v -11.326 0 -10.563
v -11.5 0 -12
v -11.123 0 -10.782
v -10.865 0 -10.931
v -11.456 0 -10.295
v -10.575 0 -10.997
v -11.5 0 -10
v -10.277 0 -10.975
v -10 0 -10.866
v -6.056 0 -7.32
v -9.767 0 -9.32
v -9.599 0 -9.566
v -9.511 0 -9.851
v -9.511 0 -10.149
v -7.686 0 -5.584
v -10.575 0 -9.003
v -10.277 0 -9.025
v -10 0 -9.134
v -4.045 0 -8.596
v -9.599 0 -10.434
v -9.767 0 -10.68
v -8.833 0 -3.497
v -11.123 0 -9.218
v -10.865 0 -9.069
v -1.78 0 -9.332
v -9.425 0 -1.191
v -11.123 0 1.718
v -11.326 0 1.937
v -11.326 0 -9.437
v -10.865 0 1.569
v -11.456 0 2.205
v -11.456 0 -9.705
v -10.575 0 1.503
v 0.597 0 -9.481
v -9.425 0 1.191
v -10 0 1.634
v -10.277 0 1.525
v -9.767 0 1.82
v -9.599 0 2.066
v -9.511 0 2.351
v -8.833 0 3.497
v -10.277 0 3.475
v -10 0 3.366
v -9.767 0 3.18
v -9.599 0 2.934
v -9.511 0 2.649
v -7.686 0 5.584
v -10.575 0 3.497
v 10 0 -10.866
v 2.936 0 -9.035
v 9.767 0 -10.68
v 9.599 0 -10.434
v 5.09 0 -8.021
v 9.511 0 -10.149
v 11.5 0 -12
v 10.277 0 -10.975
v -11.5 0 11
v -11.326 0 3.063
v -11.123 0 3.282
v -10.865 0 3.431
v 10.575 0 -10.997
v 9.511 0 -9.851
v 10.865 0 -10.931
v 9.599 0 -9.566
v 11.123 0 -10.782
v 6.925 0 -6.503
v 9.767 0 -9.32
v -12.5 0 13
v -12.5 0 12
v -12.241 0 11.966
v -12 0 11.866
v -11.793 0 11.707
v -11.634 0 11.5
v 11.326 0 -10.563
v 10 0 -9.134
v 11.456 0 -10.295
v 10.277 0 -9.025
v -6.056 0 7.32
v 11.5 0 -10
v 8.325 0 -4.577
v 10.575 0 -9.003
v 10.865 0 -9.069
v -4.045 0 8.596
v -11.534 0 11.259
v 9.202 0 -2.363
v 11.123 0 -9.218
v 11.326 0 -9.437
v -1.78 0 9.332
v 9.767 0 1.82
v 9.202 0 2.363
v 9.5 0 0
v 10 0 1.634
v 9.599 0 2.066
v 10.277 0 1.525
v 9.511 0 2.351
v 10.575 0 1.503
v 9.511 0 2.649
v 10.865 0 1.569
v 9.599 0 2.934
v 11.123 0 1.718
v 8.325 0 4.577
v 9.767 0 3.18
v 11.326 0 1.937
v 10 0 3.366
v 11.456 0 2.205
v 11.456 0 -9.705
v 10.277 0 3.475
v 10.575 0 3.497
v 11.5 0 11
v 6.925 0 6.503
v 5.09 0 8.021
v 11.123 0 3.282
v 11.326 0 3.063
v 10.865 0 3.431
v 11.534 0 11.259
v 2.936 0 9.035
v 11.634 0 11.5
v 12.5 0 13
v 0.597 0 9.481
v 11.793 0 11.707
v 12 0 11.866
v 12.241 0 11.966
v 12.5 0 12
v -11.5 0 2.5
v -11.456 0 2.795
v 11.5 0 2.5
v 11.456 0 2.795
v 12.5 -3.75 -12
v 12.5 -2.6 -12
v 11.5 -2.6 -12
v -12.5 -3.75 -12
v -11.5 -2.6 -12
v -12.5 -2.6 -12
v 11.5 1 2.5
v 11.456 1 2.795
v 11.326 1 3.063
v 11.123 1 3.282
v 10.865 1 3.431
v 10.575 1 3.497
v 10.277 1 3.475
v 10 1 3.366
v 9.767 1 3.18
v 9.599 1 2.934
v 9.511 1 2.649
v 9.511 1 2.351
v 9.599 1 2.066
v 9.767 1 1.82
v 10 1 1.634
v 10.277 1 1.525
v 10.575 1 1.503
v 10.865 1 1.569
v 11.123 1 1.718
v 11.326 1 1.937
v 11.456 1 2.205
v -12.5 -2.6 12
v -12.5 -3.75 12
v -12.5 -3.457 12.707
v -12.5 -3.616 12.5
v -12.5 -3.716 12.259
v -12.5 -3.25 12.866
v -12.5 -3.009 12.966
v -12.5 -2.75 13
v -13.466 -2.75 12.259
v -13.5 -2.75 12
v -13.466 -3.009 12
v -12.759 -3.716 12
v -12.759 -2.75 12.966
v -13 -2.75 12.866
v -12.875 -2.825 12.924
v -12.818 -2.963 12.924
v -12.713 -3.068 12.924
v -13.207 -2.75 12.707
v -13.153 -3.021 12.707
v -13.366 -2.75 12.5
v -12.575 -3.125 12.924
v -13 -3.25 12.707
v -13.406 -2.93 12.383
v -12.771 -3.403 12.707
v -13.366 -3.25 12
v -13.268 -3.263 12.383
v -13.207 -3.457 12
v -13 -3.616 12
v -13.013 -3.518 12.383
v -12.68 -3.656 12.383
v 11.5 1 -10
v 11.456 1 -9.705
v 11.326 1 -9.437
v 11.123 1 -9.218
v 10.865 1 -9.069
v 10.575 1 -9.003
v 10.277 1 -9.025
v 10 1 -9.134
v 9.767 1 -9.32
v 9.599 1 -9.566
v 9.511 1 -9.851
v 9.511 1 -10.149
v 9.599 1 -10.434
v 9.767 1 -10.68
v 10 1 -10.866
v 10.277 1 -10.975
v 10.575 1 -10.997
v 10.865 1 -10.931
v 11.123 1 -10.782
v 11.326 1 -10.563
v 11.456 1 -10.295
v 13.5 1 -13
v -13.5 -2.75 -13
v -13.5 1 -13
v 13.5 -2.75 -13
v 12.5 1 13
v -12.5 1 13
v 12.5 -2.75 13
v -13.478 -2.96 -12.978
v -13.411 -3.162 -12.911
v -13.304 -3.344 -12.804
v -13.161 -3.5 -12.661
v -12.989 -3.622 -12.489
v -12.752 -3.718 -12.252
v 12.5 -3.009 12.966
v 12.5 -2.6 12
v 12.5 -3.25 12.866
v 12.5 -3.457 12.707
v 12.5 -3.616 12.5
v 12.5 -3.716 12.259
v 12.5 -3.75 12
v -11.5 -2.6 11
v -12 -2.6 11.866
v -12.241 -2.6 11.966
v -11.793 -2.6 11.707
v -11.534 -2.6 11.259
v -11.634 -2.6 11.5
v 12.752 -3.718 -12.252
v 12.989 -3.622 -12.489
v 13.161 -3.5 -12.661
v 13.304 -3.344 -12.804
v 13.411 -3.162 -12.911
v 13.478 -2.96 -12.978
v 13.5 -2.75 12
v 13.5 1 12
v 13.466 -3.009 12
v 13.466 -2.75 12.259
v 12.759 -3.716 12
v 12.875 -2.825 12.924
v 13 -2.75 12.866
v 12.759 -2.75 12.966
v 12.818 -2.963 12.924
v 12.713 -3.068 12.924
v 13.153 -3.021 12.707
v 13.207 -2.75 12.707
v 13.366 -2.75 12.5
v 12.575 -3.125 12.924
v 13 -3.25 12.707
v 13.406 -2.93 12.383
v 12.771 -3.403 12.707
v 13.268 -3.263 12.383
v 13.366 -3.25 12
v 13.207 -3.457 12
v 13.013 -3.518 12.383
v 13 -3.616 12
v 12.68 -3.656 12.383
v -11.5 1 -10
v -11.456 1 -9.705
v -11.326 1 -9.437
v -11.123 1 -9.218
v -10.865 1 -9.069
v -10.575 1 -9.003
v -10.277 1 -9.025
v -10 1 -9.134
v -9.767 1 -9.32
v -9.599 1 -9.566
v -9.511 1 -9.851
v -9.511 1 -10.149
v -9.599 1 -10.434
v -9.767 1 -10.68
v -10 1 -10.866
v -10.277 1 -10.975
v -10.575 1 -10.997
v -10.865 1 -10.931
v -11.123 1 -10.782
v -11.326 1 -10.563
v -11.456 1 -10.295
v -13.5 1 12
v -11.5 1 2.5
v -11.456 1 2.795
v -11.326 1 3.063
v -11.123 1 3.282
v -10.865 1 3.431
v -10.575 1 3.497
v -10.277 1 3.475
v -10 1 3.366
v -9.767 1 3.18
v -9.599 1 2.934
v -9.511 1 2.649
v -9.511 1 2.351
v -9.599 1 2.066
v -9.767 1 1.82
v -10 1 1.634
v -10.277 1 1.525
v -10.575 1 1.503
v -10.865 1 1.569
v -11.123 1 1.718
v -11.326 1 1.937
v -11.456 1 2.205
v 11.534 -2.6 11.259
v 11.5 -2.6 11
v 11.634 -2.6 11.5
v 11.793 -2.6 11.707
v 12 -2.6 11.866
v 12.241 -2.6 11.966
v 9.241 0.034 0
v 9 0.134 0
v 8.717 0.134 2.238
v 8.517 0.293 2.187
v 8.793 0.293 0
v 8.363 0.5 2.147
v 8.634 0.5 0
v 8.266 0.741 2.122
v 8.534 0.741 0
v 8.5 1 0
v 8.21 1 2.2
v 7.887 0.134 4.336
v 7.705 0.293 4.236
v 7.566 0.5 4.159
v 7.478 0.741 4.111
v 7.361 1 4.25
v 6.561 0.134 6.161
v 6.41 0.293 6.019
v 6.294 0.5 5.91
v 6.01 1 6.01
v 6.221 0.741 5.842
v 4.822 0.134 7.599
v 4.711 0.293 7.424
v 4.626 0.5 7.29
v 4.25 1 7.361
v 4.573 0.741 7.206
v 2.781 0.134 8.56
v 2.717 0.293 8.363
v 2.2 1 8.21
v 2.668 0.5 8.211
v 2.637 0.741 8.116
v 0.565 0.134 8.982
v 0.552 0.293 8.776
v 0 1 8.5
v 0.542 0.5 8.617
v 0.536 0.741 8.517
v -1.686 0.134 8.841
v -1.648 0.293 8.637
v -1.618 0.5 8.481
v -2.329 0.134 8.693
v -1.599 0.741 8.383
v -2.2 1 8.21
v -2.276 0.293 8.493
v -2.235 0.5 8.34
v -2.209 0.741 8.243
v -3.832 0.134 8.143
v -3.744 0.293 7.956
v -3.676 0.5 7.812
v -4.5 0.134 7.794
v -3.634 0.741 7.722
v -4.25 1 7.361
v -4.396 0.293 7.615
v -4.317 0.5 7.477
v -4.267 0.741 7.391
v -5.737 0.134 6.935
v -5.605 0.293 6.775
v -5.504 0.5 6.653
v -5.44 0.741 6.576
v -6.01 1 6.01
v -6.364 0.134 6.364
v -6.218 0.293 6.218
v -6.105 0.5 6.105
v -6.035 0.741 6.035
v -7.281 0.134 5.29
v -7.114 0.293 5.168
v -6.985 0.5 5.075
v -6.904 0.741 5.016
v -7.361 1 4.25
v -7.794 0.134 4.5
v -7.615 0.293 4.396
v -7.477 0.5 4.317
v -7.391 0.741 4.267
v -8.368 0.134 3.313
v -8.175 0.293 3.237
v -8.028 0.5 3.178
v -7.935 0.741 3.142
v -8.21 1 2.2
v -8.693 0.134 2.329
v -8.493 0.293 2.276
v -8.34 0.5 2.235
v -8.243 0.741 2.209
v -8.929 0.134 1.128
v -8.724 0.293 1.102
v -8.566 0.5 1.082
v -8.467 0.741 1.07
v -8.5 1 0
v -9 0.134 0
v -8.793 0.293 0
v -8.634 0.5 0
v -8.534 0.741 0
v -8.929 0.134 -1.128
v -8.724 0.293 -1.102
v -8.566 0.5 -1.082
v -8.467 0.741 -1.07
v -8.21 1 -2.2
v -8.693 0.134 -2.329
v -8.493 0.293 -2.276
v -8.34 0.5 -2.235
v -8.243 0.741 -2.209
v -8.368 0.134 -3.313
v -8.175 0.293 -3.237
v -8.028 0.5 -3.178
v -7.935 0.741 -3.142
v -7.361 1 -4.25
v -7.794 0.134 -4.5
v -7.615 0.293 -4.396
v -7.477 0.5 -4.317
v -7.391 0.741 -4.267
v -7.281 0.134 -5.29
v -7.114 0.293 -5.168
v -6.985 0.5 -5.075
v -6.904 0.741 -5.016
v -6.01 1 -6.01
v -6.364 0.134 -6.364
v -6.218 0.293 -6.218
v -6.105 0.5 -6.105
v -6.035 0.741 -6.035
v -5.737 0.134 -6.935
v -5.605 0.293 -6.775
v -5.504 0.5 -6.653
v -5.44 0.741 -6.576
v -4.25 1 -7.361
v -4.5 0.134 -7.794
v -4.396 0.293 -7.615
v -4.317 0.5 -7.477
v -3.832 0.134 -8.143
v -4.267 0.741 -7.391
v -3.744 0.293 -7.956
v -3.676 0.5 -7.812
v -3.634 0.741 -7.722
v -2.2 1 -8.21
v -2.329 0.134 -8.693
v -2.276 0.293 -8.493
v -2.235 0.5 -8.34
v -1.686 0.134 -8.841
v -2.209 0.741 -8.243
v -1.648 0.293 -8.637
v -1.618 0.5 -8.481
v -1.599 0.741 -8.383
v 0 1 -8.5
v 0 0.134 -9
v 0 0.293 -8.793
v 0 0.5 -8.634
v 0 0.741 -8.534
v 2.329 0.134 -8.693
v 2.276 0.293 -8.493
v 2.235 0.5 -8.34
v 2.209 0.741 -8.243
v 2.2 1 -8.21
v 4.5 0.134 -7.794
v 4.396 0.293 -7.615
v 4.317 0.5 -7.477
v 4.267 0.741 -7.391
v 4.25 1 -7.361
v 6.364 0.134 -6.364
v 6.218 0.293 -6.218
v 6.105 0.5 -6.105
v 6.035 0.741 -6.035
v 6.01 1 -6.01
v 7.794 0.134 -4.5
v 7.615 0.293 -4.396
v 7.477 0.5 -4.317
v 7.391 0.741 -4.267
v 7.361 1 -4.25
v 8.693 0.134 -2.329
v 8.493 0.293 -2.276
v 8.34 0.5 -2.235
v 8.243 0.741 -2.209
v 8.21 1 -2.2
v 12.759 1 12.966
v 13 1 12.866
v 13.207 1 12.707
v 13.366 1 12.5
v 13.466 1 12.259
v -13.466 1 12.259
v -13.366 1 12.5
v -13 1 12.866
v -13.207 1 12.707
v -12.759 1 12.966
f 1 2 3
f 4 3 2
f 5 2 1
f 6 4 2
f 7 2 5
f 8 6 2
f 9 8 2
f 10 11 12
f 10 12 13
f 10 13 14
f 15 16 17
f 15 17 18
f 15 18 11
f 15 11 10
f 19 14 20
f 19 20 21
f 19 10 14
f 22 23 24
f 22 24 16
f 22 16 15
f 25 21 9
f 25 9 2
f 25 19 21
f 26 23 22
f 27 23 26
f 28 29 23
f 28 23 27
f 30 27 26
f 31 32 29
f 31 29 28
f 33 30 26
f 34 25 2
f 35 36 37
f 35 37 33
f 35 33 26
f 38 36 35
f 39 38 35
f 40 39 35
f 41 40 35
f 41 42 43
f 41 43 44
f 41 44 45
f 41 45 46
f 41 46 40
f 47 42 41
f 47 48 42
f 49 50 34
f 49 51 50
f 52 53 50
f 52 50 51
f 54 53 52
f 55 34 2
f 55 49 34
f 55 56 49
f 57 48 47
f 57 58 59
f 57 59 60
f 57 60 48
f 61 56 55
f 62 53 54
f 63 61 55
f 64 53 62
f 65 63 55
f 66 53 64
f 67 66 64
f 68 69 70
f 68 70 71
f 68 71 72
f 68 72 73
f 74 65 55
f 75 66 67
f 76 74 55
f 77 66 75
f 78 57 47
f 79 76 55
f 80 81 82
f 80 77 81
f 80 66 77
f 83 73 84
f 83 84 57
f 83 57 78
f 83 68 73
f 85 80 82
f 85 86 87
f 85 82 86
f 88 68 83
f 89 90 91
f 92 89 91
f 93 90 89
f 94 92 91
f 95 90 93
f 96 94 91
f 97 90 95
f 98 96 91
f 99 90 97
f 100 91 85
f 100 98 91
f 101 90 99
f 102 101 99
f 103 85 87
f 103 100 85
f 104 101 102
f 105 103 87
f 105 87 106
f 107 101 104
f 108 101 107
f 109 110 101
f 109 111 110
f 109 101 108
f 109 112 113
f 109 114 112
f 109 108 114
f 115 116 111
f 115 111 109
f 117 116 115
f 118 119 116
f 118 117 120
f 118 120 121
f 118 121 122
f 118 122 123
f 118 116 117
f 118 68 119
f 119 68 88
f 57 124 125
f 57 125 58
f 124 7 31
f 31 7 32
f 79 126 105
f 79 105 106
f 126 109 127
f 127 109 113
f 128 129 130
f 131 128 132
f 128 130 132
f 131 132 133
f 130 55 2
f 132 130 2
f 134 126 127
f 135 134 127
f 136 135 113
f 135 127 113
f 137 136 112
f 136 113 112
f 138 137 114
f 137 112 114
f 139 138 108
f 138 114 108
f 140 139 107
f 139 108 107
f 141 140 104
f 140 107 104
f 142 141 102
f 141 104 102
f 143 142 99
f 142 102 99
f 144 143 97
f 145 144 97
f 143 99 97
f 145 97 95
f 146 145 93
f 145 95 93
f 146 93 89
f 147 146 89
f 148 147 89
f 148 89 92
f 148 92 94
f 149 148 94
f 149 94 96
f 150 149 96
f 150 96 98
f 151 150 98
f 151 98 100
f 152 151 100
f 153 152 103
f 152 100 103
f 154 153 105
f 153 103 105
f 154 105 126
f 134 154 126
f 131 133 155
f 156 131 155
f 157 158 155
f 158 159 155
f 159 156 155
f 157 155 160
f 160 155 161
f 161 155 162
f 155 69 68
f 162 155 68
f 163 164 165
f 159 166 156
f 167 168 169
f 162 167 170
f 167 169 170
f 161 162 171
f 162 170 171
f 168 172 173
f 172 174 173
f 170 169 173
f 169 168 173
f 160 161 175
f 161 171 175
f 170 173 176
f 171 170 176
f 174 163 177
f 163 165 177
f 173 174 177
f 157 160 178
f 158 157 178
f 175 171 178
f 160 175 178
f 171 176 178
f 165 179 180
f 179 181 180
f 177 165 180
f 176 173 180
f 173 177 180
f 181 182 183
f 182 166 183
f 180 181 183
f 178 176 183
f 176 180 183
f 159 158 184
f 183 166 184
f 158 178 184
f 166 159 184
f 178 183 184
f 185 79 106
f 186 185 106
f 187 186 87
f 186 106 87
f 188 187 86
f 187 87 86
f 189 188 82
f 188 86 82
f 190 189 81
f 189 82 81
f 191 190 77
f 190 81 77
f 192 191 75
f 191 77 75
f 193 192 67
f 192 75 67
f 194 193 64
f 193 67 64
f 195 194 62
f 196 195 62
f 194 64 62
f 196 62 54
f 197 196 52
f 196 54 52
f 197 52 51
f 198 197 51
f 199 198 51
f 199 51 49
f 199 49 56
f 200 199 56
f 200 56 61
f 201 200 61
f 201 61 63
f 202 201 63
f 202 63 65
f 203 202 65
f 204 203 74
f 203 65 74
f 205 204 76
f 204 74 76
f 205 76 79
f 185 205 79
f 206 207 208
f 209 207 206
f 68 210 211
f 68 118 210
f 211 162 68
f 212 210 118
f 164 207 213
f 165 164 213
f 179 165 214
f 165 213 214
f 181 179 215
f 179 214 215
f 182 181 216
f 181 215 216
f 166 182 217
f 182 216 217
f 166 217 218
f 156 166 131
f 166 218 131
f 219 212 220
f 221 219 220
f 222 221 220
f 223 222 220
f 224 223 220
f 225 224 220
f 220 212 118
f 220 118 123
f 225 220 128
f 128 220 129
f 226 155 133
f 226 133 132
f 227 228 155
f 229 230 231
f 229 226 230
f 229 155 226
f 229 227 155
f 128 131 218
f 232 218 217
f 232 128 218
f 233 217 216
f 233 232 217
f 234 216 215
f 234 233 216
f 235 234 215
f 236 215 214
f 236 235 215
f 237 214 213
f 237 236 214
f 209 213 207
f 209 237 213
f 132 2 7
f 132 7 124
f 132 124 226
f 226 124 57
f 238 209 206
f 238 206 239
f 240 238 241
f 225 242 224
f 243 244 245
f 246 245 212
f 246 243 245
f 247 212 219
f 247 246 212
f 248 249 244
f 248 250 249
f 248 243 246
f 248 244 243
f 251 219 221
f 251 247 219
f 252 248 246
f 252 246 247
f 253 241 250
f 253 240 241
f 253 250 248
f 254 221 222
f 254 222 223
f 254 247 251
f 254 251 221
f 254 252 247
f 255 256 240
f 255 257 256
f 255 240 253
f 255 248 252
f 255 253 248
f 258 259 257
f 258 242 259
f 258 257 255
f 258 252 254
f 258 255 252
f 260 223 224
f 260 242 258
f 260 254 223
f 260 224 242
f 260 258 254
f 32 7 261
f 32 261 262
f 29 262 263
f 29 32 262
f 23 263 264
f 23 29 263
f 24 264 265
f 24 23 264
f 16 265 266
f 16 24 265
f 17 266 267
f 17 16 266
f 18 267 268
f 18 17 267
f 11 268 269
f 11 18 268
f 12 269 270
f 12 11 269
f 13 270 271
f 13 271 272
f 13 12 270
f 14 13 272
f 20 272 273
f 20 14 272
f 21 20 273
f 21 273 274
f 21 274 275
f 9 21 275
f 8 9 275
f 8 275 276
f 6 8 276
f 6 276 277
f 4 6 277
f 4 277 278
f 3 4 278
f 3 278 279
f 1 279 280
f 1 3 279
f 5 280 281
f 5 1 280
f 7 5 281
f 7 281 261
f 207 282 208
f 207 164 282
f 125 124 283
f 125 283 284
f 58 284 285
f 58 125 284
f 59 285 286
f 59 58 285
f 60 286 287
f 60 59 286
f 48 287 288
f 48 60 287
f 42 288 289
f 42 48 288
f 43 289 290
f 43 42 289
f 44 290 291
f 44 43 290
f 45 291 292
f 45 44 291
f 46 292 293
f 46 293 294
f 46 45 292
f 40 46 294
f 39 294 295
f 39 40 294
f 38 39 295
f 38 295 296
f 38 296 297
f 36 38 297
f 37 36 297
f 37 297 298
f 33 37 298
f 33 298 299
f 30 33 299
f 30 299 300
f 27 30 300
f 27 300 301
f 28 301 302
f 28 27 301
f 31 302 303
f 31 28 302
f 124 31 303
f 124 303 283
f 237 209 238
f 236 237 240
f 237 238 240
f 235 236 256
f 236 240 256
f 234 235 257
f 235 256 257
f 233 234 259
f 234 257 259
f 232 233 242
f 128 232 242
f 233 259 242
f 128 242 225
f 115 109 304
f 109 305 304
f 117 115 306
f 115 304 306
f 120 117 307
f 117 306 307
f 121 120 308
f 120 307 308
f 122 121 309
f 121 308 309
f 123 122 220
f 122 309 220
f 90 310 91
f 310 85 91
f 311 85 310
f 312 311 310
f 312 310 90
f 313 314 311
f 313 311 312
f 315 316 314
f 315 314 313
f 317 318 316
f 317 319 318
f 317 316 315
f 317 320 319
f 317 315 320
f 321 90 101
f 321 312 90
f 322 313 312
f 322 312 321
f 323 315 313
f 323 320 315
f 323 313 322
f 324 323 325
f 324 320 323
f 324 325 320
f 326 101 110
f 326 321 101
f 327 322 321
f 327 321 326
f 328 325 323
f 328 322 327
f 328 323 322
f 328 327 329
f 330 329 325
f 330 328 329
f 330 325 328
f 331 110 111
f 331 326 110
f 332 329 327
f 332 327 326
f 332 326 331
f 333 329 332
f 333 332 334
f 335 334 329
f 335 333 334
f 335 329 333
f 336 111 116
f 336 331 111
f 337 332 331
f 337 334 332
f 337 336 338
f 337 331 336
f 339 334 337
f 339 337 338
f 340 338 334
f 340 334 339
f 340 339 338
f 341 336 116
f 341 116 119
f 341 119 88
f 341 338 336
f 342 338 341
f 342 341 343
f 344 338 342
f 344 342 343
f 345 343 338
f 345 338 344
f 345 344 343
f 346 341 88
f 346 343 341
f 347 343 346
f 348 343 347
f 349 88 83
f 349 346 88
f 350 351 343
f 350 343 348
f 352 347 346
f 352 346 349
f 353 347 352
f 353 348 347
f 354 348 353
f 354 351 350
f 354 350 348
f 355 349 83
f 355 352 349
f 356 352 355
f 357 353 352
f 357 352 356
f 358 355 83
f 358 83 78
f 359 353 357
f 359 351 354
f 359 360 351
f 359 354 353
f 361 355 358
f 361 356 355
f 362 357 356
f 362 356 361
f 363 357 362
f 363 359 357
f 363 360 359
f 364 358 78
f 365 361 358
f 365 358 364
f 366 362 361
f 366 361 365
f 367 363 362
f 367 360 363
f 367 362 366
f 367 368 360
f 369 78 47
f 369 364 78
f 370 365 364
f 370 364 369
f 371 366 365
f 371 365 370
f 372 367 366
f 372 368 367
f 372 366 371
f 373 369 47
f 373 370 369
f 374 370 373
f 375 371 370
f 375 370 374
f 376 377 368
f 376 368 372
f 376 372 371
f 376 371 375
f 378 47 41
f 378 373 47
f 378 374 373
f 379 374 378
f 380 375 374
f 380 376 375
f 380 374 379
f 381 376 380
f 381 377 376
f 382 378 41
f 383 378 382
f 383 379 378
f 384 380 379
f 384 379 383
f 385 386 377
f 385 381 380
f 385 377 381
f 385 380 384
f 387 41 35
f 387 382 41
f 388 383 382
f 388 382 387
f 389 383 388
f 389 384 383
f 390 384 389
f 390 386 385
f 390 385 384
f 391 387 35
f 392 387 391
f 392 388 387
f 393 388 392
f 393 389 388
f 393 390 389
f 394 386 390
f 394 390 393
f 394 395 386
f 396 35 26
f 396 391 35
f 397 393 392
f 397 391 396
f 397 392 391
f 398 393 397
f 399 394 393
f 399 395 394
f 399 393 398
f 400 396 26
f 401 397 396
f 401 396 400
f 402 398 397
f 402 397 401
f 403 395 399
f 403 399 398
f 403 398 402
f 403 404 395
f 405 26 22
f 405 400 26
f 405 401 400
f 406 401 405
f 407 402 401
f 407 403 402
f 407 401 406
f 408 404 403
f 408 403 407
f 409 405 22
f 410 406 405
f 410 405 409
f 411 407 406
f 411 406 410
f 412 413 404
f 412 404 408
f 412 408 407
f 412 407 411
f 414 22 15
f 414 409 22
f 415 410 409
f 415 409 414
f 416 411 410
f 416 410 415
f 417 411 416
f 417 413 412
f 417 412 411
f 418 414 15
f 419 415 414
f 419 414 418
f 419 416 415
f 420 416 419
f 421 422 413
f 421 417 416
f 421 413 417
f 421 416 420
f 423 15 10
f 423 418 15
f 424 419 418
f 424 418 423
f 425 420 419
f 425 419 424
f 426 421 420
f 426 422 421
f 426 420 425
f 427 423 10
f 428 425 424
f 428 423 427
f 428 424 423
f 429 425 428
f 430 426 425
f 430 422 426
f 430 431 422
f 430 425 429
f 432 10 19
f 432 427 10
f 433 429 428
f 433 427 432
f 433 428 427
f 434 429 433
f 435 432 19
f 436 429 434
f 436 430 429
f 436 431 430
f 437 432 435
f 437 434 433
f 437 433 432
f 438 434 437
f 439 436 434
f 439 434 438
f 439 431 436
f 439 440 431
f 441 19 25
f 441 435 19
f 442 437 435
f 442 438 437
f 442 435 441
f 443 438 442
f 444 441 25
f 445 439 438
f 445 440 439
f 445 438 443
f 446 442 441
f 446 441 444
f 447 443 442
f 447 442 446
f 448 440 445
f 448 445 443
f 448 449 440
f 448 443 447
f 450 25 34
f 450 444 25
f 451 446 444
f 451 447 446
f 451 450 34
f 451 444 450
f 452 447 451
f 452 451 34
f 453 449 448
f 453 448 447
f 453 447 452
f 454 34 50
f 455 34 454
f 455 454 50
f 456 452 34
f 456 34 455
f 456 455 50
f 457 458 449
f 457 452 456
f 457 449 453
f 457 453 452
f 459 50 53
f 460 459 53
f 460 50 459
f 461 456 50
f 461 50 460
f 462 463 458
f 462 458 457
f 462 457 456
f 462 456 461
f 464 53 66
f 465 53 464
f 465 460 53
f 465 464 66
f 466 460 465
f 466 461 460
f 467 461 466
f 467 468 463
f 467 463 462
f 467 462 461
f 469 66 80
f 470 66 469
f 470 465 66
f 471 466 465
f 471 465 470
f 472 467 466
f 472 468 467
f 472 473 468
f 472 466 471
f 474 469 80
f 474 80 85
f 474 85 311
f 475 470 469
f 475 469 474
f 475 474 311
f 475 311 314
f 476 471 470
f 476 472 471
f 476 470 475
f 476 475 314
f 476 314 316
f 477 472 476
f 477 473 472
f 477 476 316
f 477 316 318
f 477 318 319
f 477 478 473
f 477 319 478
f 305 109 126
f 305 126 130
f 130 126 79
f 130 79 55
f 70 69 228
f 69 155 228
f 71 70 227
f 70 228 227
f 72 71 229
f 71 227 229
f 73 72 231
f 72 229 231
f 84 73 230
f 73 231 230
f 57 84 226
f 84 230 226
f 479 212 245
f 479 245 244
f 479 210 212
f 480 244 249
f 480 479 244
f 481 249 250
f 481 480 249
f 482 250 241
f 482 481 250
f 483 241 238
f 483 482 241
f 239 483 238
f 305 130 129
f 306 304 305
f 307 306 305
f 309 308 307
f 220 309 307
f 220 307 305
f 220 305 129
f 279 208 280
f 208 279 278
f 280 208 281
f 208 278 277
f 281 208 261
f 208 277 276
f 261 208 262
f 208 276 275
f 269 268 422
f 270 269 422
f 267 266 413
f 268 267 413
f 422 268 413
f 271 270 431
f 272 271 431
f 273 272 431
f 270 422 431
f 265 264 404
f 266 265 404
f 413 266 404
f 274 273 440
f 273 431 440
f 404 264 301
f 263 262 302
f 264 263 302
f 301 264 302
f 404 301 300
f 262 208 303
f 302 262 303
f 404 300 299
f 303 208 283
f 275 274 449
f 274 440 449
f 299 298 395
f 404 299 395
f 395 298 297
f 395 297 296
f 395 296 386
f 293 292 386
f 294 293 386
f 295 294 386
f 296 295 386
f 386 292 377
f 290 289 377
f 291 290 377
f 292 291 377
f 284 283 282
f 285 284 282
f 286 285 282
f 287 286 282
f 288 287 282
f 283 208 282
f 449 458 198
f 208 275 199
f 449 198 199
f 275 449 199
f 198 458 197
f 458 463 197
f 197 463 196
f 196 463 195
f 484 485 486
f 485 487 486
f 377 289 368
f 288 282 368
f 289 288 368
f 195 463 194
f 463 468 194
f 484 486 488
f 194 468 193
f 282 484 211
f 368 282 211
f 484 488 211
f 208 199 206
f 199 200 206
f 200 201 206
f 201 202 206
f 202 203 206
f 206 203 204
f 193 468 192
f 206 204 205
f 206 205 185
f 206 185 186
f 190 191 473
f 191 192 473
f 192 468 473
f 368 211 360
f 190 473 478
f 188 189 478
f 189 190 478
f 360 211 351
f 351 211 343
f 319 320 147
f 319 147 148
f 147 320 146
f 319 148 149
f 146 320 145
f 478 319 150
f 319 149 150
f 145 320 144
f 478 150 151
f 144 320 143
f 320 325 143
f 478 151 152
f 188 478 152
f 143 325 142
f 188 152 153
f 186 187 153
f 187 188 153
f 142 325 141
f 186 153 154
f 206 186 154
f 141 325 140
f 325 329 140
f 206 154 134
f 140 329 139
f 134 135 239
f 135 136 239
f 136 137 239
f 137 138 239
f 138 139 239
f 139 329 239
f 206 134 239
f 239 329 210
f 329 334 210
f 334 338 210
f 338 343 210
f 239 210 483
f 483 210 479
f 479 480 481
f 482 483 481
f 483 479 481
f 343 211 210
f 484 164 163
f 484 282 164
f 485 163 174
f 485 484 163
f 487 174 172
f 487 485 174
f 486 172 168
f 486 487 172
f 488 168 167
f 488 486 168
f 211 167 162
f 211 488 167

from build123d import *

# Parameters (mm, degrees)
F0_W     = 23
F0_H     = 1
F0_W_2   = 1
F1_DEPTH = 3.75
F2_DEPTH = 2.6
F0_R     = 1
F0_R_2   = 8.5
F3_DEPTH = 1
F4_R     = 0.99999


# Not quite as in the source:
# - a fillet or chamfer is up to 0.001 mm smaller than in the source, because OpenCascade refuses the exact size


with BuildPart() as f1:
    # F0 (on Front) → F1 (new body)
    with BuildSketch(Plane.XZ):
        Polygon((-12.5, -13), (-12.5, -12), (-12.5, 12), (-12.5, 13), (-13.5, 13), (-13.5, -13), align=None)
        Polygon((12.5, 12), (12.5, -12), (12.5, -13), (13.5, -13), (13.5, 13), (12.5, 13), align=None)
        with Locations((0, -12.5)):
            Rectangle(F0_W, F0_H)
        with Locations((-12, -12.5)):
            Rectangle(F0_W_2, F0_H)
        with Locations((12, -12.5)):
            Rectangle(F0_W_2, F0_H)
    extrude(amount=F1_DEPTH)

    # F0 (on Front) → F2 (join)
    with BuildSketch(Plane.XZ):
        Polygon((-12.5, -12), (-11.5, -12), (-11.5, -10), (-11.5, 2.5), (-11.5, 12), (-12.5, 12), align=None)
        Polygon((11.5, -12), (12.5, -12), (12.5, 12), (11.5, 12), (11.5, 2.5), (11.5, -10), align=None)
    extrude(amount=F2_DEPTH)

    # F0 (on Front) → F3 (join)
    with BuildSketch(Plane.XZ):
        Polygon((-11.5, -12), (11.5, -12), (11.5, -10), (11.5, 2.5), (11.5, 12), (-11.5, 12), (-11.5, 2.5), (-11.5, -10), align=None)
        with BuildLine():
            ThreePointArc((-9.5, -10), (-10.5, -11), (-11.5, -10))
            ThreePointArc((-11.5, -10), (-10.5, -9), (-9.5, -10))
        make_face(mode=Mode.SUBTRACT)
        with Locations((10.5, -10)):
            Circle(F0_R, mode=Mode.SUBTRACT)
        with BuildLine():
            ThreePointArc((-9.5, 2.5), (-10.5, 1.5), (-11.5, 2.5))
            ThreePointArc((-11.5, 2.5), (-10.5, 3.5), (-9.5, 2.5))
        make_face(mode=Mode.SUBTRACT)
        Circle(F0_R_2, mode=Mode.SUBTRACT)
        with Locations((10.5, 2.5)):
            Circle(F0_R, mode=Mode.SUBTRACT)
        with Locations((0, 12.5)):
            Rectangle(F0_W, F0_H)
        Polygon((-12.5, -13), (-12.5, -12), (-12.5, 12), (-12.5, 13), (-13.5, 13), (-13.5, -13), align=None)
        Polygon((-12.5, -12), (-11.5, -12), (-11.5, -10), (-11.5, 2.5), (-11.5, 12), (-12.5, 12), align=None)
        with Locations((-12, 12.5)):
            Rectangle(F0_W_2, F0_H)
        with Locations((-12, -12.5)):
            Rectangle(F0_W_2, F0_H)
        with Locations((0, -12.5)):
            Rectangle(F0_W, F0_H)
        with Locations((12, -12.5)):
            Rectangle(F0_W_2, F0_H)
        Polygon((11.5, -12), (12.5, -12), (12.5, 12), (11.5, 12), (11.5, 2.5), (11.5, -10), align=None)
        Polygon((12.5, 12), (12.5, -12), (12.5, -13), (13.5, -13), (13.5, 13), (12.5, 13), align=None)
        with Locations((12, 12.5)):
            Rectangle(F0_W_2, F0_H)
    extrude(amount=-F3_DEPTH)

    # F4 (radius 1 in the source; OpenCascade refuses exactly that, so slightly less here)
    f4_edges = [f1.edges().sort_by_distance(p)[0] for p in [
        (-13.5, -3.75, 0),
        (13.5, -3.75, 0),
        (0, -3.75, -13),
        (-13.5, -1.375, 13),
        (13.5, -1.375, 13),
        (-13, -3.75, 13),
        (13, -3.75, 13),
        (11.5, -1.3, 12),
        (-11.5, -1.3, 12),
        (-8.5, 0, 0),
    ]]
    fillet(f4_edges, radius=F4_R)


solid = f1.part
